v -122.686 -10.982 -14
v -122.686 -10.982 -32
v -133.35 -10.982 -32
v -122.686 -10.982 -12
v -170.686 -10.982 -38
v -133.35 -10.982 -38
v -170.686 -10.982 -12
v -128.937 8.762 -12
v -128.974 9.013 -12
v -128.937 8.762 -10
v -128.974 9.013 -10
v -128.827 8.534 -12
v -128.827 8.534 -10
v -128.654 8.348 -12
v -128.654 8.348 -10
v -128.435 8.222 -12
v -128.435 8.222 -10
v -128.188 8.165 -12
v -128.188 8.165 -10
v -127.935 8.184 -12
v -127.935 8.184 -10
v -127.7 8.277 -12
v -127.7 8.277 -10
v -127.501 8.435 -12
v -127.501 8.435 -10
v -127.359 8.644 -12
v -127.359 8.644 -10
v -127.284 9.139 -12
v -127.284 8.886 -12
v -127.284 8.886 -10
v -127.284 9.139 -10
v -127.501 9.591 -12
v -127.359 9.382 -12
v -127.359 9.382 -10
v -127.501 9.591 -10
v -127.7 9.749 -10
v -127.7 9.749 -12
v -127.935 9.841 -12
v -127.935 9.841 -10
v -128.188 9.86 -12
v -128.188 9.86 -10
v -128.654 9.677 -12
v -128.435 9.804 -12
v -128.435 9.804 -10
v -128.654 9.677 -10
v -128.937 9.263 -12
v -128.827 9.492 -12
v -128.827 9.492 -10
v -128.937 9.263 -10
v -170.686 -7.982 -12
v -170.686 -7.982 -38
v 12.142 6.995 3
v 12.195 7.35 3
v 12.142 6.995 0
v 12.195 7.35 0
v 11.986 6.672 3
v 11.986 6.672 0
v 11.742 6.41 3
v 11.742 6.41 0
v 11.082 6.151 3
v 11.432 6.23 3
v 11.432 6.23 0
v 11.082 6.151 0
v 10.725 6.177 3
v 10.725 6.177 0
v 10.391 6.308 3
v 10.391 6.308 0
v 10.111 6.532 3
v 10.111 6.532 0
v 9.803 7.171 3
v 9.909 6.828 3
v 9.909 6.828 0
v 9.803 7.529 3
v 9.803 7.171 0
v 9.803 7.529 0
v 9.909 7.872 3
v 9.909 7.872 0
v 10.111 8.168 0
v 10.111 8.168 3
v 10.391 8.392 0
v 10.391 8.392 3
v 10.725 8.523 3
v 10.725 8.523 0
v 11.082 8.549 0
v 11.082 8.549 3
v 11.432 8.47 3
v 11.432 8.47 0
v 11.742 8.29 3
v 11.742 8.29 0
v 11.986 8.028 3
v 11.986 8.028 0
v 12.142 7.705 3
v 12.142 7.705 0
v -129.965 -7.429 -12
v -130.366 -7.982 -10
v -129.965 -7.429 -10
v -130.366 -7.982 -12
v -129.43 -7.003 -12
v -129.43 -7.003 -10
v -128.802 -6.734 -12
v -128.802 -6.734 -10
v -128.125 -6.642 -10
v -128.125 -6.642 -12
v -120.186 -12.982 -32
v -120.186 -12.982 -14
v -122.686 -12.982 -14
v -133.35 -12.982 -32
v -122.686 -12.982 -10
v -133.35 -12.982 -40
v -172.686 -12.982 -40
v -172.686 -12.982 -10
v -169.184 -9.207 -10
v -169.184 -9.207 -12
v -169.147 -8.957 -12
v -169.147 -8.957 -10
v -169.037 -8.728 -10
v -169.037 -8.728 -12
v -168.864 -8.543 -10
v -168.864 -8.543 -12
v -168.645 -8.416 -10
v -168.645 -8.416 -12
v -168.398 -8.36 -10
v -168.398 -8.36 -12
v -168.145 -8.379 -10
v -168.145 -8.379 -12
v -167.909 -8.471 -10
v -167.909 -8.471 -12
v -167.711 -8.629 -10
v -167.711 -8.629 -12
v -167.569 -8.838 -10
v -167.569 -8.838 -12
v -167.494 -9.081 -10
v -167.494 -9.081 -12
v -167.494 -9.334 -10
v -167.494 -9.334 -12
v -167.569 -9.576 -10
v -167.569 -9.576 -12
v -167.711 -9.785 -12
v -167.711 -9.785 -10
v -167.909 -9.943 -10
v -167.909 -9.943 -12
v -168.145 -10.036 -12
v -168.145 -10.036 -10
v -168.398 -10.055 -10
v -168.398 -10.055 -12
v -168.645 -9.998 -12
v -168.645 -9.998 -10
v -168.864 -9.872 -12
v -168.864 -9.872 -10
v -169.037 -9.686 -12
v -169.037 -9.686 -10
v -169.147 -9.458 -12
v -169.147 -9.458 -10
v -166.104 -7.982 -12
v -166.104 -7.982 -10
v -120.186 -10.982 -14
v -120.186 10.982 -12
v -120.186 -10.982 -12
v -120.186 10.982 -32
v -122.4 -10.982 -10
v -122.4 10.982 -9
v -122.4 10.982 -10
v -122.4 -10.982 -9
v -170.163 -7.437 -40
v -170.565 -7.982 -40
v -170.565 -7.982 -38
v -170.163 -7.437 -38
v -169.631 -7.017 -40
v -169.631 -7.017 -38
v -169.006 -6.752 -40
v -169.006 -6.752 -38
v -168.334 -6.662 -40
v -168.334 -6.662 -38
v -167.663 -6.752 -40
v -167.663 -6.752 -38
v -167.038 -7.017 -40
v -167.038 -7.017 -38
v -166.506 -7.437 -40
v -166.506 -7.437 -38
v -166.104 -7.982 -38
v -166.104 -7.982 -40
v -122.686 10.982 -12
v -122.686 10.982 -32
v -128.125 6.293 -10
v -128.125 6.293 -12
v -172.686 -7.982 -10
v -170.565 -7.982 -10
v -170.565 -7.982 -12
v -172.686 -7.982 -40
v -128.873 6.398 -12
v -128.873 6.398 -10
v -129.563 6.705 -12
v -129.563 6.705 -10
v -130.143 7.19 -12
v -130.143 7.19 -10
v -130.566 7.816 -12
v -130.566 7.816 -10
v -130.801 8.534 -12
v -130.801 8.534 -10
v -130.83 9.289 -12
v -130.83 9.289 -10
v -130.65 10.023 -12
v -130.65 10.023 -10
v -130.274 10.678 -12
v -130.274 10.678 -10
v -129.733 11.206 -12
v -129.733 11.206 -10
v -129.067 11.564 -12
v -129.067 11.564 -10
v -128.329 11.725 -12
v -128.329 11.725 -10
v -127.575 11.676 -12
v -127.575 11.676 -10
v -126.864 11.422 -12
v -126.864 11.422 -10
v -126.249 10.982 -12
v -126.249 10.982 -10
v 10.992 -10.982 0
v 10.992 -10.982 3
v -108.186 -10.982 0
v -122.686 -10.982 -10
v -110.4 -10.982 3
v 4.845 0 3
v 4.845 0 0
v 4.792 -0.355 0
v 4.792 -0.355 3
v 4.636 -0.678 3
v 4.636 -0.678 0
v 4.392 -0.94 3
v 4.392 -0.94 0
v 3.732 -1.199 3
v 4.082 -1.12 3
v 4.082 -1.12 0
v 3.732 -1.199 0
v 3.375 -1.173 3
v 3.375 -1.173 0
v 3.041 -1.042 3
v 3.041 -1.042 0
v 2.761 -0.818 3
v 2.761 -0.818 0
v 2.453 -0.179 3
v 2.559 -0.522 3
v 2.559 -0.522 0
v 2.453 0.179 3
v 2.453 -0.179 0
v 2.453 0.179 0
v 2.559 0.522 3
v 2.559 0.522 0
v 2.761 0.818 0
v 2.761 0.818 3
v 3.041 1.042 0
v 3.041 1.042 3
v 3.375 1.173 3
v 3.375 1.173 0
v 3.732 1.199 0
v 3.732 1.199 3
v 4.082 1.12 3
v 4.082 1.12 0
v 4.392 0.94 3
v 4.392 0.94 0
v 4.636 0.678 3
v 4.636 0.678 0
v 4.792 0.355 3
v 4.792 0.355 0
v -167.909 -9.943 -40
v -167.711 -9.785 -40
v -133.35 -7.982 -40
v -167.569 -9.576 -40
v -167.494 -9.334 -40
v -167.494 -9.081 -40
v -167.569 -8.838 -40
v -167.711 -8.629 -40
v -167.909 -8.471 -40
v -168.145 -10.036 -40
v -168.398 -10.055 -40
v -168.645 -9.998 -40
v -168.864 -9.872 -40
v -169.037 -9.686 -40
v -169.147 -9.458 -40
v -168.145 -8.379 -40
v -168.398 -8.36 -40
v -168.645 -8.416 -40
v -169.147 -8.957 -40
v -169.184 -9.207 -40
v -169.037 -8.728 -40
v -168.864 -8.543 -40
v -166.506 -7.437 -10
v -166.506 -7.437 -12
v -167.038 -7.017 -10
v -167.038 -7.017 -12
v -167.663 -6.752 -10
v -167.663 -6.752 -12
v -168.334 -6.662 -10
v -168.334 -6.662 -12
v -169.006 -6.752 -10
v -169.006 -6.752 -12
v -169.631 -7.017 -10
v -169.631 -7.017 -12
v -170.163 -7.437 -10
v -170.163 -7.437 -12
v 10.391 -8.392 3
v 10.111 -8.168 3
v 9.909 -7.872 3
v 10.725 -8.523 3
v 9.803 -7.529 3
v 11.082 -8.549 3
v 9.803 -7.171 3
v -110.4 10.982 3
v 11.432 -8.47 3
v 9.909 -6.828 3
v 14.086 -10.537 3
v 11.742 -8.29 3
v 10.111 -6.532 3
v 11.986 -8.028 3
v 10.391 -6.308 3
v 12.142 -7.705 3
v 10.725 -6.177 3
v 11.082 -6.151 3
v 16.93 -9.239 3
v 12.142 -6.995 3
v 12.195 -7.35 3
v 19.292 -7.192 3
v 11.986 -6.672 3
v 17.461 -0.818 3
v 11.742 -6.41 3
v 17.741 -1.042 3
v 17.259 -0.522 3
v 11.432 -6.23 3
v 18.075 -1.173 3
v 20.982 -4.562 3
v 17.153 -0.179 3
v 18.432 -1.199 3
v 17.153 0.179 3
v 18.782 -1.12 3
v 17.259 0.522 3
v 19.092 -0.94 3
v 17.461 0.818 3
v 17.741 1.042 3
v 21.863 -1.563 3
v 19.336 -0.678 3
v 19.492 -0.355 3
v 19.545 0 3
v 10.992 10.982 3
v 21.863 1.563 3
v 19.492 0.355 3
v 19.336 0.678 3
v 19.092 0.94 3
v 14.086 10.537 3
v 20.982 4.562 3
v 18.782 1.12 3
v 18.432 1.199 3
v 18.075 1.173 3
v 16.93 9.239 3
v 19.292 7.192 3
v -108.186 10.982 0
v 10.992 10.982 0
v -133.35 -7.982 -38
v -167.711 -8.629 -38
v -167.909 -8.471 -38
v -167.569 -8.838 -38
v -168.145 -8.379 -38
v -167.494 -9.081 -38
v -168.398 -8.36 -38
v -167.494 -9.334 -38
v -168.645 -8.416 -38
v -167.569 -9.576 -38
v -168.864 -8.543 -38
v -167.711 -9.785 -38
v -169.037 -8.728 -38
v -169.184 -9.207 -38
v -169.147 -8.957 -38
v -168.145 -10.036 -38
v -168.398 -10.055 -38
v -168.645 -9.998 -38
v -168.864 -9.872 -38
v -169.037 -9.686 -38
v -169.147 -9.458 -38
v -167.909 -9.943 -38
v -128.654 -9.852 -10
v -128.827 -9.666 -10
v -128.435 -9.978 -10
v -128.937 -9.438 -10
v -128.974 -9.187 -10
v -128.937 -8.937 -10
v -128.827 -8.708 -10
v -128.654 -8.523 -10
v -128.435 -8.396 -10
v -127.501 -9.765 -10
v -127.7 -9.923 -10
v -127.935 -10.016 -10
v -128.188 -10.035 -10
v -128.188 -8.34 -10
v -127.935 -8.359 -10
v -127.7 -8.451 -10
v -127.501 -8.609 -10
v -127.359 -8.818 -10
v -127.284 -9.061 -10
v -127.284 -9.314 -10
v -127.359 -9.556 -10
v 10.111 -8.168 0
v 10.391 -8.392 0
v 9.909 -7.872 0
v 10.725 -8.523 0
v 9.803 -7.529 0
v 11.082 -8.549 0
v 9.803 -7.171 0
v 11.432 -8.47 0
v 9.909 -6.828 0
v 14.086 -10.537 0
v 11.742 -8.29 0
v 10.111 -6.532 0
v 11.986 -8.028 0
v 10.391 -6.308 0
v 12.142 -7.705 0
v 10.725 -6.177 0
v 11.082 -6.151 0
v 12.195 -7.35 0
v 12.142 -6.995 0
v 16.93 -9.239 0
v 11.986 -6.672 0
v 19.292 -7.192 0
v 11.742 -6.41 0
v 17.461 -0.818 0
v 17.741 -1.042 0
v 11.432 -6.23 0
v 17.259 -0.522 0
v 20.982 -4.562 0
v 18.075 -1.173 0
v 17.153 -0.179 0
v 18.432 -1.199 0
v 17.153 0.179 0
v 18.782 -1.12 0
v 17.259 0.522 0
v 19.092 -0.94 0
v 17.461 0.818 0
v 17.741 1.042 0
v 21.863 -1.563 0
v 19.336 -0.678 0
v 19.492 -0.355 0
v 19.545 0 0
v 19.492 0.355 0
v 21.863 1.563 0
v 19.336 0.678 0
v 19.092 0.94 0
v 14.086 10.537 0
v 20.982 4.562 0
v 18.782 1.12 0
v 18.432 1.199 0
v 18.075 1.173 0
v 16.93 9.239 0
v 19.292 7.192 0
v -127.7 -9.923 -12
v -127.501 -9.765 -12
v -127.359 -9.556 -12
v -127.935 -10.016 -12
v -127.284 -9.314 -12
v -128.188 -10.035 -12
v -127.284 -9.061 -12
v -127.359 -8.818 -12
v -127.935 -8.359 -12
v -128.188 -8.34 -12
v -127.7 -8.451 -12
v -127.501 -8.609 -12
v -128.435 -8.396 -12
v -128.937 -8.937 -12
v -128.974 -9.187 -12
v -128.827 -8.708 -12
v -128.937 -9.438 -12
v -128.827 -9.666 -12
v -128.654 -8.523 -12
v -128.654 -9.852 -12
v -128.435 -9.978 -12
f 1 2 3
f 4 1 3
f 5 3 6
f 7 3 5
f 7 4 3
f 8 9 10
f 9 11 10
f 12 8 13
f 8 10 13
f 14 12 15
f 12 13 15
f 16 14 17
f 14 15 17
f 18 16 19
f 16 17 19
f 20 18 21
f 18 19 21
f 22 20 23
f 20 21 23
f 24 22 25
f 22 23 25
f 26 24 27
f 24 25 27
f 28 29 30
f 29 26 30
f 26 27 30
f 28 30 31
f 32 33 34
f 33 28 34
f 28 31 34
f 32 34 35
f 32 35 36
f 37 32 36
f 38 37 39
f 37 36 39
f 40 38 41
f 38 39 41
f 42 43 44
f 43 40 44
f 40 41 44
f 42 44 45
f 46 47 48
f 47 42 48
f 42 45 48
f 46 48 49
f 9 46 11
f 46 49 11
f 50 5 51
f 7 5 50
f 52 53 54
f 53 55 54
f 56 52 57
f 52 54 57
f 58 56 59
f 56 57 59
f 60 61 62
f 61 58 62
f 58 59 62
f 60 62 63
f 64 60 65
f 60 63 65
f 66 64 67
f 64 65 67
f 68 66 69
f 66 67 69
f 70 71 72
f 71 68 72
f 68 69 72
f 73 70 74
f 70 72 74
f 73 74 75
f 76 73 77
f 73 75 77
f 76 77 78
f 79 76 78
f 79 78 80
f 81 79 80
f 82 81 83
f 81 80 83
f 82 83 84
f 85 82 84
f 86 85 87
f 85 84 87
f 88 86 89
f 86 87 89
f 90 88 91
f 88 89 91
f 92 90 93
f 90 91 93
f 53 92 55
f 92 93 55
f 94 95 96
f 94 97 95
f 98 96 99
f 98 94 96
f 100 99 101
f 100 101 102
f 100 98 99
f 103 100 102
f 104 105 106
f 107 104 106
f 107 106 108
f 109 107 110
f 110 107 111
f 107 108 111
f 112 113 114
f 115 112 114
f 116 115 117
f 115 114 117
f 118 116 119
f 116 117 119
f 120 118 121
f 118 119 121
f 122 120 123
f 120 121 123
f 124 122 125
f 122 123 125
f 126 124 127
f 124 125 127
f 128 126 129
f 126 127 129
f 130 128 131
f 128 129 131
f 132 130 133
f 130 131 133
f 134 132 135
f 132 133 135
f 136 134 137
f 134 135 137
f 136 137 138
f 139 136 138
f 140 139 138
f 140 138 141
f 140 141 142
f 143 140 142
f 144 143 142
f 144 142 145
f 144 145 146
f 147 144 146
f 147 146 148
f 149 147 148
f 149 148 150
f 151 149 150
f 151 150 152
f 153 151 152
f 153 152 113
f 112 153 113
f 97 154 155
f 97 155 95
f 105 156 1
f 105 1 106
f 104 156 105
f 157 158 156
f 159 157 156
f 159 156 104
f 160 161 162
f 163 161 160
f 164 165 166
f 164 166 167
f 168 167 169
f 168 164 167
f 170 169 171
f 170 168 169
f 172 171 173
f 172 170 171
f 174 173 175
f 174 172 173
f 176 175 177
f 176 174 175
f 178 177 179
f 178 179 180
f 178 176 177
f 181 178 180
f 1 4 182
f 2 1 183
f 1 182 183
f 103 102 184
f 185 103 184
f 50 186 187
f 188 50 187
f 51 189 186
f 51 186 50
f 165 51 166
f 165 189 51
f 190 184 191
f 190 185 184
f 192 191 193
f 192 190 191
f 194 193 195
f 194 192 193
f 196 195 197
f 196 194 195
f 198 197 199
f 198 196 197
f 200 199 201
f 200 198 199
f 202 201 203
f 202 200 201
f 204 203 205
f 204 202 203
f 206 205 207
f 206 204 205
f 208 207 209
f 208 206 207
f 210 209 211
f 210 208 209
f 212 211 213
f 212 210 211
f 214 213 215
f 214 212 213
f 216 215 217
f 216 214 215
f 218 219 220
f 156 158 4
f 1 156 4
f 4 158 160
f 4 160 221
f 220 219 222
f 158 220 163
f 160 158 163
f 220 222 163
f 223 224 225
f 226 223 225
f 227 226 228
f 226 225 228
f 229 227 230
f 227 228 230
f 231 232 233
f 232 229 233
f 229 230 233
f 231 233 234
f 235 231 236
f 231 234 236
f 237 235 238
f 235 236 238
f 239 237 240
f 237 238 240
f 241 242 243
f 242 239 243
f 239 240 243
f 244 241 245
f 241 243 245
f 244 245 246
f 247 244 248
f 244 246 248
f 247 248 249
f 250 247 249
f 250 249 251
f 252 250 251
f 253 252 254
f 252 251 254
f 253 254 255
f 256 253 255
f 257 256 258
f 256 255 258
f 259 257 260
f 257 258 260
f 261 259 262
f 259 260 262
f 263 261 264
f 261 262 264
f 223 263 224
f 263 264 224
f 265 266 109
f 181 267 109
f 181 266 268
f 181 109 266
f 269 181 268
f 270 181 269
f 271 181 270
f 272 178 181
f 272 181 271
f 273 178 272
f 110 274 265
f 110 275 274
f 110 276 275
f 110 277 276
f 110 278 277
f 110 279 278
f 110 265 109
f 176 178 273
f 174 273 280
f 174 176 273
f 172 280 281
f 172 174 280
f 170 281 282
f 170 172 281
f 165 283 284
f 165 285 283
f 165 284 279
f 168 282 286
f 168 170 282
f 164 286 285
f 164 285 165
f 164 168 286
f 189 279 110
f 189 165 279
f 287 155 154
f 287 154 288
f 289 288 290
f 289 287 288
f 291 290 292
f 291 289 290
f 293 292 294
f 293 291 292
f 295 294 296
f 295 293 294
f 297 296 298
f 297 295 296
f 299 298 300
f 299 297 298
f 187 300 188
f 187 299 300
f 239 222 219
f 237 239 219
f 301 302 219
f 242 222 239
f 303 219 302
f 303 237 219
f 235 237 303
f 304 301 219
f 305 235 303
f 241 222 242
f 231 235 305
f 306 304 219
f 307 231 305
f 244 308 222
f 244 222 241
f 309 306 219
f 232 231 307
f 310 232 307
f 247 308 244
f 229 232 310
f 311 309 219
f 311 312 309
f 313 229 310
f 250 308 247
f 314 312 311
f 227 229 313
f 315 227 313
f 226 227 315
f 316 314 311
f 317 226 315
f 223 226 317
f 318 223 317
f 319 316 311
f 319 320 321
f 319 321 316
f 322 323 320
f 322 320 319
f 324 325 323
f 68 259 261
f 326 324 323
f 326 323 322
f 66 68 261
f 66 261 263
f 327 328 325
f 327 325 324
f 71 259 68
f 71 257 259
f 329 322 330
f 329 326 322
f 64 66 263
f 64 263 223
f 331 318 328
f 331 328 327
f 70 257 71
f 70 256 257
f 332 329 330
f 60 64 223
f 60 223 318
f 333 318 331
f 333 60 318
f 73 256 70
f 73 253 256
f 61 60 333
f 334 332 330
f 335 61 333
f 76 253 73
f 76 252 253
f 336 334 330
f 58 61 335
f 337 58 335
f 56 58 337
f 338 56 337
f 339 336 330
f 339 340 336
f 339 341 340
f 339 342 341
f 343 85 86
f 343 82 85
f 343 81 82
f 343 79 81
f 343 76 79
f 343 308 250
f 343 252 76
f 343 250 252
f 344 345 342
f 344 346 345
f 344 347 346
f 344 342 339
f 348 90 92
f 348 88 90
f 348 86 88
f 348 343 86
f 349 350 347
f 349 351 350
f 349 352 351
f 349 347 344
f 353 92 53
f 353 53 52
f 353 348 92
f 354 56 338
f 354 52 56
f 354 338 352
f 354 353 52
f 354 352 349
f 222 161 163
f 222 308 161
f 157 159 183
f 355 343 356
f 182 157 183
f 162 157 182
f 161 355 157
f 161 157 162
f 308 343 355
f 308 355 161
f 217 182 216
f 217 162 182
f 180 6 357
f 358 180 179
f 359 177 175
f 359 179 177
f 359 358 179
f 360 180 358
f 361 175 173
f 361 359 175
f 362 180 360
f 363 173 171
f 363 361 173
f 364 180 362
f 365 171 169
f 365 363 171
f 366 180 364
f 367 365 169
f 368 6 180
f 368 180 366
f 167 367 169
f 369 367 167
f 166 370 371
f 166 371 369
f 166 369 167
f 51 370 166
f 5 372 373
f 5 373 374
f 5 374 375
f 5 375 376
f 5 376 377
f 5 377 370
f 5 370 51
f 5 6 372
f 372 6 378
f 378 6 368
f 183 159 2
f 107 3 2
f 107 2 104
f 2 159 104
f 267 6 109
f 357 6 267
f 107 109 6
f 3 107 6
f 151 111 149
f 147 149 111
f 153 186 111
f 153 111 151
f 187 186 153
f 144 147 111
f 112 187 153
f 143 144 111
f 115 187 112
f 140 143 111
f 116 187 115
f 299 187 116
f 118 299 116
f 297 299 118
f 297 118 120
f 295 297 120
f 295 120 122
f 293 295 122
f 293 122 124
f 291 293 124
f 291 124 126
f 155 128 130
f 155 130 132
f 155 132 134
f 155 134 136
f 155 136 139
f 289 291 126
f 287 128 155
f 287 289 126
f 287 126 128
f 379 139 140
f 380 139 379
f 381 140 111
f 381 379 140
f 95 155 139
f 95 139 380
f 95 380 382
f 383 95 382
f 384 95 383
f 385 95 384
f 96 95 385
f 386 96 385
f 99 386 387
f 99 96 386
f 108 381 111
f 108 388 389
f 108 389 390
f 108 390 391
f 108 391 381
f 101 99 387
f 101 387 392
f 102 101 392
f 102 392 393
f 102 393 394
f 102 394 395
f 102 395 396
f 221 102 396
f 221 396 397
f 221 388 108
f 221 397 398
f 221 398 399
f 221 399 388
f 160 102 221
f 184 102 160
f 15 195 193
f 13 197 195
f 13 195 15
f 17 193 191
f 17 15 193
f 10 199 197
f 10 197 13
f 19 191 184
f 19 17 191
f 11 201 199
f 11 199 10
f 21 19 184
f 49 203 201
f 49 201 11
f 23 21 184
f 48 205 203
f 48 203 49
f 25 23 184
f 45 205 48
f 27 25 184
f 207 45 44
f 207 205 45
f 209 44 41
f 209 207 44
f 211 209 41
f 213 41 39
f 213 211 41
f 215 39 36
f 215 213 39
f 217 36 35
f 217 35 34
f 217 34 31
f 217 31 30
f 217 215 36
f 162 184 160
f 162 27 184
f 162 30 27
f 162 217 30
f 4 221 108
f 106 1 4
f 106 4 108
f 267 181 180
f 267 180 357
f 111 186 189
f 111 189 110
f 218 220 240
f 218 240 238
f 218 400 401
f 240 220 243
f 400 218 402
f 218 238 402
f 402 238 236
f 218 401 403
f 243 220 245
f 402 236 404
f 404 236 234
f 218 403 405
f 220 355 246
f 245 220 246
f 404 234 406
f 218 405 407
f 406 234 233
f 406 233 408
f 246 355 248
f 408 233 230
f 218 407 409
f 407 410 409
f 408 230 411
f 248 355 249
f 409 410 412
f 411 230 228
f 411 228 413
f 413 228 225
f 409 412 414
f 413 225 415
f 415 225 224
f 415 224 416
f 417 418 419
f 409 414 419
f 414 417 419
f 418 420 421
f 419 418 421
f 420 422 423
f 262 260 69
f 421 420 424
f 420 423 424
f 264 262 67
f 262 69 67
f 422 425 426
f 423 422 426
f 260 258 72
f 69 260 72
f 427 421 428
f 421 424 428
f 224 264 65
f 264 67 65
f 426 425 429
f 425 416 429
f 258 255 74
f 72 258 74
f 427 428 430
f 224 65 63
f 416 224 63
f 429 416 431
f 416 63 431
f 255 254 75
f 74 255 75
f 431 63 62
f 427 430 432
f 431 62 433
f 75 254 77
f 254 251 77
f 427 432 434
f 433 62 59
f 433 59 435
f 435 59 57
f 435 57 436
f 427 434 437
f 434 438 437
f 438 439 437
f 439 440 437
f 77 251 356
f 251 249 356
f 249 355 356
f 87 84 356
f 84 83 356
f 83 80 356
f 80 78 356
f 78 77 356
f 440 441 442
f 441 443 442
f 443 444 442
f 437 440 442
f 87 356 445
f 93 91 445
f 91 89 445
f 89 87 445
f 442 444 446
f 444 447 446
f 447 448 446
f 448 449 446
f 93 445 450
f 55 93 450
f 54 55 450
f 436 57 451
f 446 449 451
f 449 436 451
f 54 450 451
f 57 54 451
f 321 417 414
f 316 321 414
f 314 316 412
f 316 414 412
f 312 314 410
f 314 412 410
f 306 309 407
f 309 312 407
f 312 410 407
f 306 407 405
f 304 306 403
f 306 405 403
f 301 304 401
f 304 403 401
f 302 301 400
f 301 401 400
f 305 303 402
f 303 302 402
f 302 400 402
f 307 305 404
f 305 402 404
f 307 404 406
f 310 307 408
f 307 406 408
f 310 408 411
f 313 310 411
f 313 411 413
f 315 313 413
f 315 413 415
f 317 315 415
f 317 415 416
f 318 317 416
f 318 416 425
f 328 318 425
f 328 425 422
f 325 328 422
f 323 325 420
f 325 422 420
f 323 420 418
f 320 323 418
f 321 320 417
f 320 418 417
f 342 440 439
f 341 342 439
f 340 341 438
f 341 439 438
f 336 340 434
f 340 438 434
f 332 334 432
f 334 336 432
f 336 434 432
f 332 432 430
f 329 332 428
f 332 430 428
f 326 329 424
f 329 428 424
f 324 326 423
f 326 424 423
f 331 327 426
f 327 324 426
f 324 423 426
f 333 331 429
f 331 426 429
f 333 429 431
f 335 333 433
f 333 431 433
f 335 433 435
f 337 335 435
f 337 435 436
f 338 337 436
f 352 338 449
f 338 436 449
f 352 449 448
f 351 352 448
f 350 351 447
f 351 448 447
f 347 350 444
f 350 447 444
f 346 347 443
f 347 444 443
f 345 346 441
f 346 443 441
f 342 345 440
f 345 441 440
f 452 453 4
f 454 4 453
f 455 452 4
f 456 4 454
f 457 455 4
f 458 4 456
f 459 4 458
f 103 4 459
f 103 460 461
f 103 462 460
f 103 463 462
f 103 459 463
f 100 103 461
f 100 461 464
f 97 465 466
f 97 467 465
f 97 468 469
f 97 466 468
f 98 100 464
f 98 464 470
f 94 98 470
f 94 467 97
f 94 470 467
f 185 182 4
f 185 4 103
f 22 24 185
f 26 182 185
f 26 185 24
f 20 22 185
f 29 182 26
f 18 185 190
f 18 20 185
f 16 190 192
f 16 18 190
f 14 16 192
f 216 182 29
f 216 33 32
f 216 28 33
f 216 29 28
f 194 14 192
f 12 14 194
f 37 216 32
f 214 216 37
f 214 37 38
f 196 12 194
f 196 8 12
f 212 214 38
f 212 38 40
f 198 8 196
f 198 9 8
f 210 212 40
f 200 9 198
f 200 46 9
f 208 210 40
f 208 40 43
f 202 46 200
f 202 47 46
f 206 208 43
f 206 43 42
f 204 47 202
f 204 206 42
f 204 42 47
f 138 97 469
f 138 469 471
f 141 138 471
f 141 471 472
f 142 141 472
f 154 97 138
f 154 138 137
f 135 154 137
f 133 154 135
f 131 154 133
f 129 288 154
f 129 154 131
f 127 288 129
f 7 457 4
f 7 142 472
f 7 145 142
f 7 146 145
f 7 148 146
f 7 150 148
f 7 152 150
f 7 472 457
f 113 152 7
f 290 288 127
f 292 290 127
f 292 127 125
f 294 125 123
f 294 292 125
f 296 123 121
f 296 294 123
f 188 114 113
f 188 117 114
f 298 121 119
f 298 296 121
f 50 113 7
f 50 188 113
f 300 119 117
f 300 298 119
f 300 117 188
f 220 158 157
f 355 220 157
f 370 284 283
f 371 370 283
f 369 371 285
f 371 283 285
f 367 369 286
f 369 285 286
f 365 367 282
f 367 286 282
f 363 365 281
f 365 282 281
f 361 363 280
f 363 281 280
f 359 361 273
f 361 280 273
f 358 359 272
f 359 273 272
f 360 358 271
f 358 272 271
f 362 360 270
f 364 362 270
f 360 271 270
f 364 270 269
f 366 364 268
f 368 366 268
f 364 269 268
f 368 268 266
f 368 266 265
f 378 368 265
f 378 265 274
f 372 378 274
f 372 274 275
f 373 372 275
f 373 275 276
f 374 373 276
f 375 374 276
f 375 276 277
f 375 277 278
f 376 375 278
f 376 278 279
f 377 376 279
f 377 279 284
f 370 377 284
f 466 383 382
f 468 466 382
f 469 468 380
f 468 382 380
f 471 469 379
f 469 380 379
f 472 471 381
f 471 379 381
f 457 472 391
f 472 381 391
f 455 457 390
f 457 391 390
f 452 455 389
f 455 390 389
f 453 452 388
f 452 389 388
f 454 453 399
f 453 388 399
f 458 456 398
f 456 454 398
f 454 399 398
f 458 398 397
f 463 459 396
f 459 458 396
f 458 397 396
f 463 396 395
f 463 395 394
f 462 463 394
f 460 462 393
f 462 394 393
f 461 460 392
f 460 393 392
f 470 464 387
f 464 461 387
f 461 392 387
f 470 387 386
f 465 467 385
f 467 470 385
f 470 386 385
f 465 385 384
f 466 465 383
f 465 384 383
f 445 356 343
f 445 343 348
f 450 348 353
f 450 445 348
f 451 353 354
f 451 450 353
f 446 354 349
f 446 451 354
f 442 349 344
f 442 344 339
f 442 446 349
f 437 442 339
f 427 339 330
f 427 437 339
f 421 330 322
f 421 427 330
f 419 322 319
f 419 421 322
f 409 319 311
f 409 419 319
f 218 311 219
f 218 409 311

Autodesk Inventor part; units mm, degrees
ref_plane "YZ Plane" through (0, 0, 0) normal (1, 0, 0) x (0, 1, 0)
ref_plane "XZ Plane" through (0, 0, 0) normal (0, 1, 0) x (-1, 0, 0)
ref_plane "XY Plane" through (0, 0, 0) normal (0, 0, 1) x (1, 0, 0)
ref_plane "Plano de trabajo1" through (0, 0, 0) normal (0, 0, 1) x (1, 0, 0)
sketch "Boceto1" plane through (0, 0, 0) normal (0, 0, 1) x (1, 0, 0)
  circle A0 centre (10.9923, -7.35) radius 1.2028 projected
  circle A1 centre (3.6423, 0) radius 1.2028 projected
  circle A2 centre (18.3423, 0) radius 1.2028 projected
  circle A3 centre (10.9923, 7.35) radius 1.2028 projected
  circle A4 centre (10.9923, 0) radius 10.9823 projected
  line L0 (10.9923, -10.9823) -> (-139.0077, -10.9823)
  line L1 (10.9923, 10.9823) -> (-139.0077, 10.9823)
  line L2 (-139.0077, 10.9823) -> (-139.0077, -10.9823)
  point P0 (0, 0)
  dimension "d0" = 150
  dimension "d1" = 150
extrude "Extrusión1" add sketch "Boceto1" along normal blind 3
sketch "Boceto2" plane through (0, 0, 3) normal (0, 0, 1) x (1, 0, 0)
  arc A0 (-129.1978, -5.6745) -> (-132.1454, -8.5217) centre (-128.1245, -9.7351) ccw
  circle A1 centre (-128.1245, 8.4649) radius 0.85 construction
  circle A2 centre (-128.1245, -9.7351) radius 0.7049 construction
  line L0 (-139.0305, -11.0697) -> (-267.2186, 10.8953)
  line L1 (-267.2186, -11.0694) -> (-117.2186, -11.0694)
  line L2 (-139.0305, 10.8953) -> (-139.0305, -11.0694)
  line L3 (-117.2186, 10.8953) -> (-267.2186, 10.8953)
  line L4 (-128.1245, -11.0697) -> (-128.1245, -0.0872)
  line L5 (-128.1245, -0.0872) -> (-128.1245, 9.0128)
  line L6 (-128.1245, -0.0872) -> (-128.1245, -9.1872)
  circle A3 centre (-128.1245, -9.1872) radius 0.85
  circle A4 centre (-128.1245, 9.0128) radius 0.85
  circle A5 centre (-128.1245, -9.1872) radius 1.8825
  circle A6 centre (-128.1245, 9.0128) radius 1.8821
  circle A7 centre (-128.1245, 9.0128) radius 0.85
  circle A8 centre (-128.1245, -9.1872) radius 0.85
  line L7 (-128.1245, 10.8953) -> (-139.0305, 10.8953)
  line L8 (-139.0077, 10.9823) -> (-139.0077, -10.9823) projected
  line L9 (-139.0077, -10.9823) -> (-139.0077, 10.9823)
  line L10 (-139.0077, 10.9823) -> (-139.0077, -10.9823)
  point P0 (0, 0)
  dimension "d4" = 10.9825
  dimension "d5" = 9.1
  dimension "d6" = 9.1
  dimension "d7" = 1.7
  dimension "d8" = 1.7
extrude "Extrusión2" cut sketch "Boceto2" against normal blind 3 contours A3 L4 | L4 A3 | A4
sketch "Boceto3" plane through (0, 0, 3) normal (0, 0, 1) x (1, 0, 0)
  circle A0 centre (-128.1245, -9.1872) radius 0.85 projected
  circle A1 centre (-128.1245, 9.0128) radius 0.85 projected
  line L0 (10.9923, 10.9823) -> (-139.0077, 10.9823) projected
  line L1 (-139.0077, 10.9823) -> (-139.0077, -10.9823) projected
  line L2 (-139.0077, -10.9823) -> (10.9923, -10.9823) projected
  arc A2 (10.9923, -10.9823) -> (10.9923, 10.9823) centre (10.9923, 0) ccw projected
  circle A3 centre (10.9923, -7.35) radius 1.2028 projected
  circle A4 centre (3.6423, 0) radius 1.2028 projected
  circle A5 centre (18.3423, 0) radius 1.2028 projected
  circle A6 centre (10.9923, 7.35) radius 1.2028 projected
  line L3 (-130.1442, 5.5225) -> (-129.5361, 14.2169) projected
  circle A7 centre (-128.1245, -9.1872) radius 1.7951
  circle A8 centre (-128.1245, 9.0128) radius 1.9695
  line L4 (-128.1245, -7.3921) -> (-128.1245, 7.0432)
  line L5 (-128.1245, -10.9823) -> (-128.1245, -18.0451)
  line L6 (-128.1245, -18.0451) -> (-142.6221, -18.554)
  line L7 (-142.6221, -18.554) -> (-141.7315, 12.8288)
  line L8 (-141.7315, 12.8288) -> (-128.1245, 12.4426)
  line L9 (-128.1245, 12.4426) -> (-128.1245, 10.9823)
  point P0 (0, 0)
extrude "Extrusión3" cut sketch "Boceto3" against normal blind 3 contours A8 L3 L0 | L3 A8 L4 A7 L2 L1 L0
sketch "Boceto4" plane through (0, 0, 0) normal (0, 0, -1) x (-1, 0, 0)
  arc A0 (128.1245, 7.0432) -> (128.1245, 10.9823) centre (128.1245, 9.0128) ccw projected
  line L0 (-10.9923, 10.9823) -> (128.1245, 10.9823) projected
  arc A1 (-10.9923, 10.9823) -> (-10.9923, -10.9823) centre (-10.9923, 0) ccw projected
  line L1 (128.1245, -10.9823) -> (-10.9923, -10.9823) projected
  arc A2 (128.1245, -10.9823) -> (128.1245, -7.3921) centre (128.1245, -9.1872) ccw projected
  line L2 (128.1245, -7.3921) -> (128.1245, 7.0432) projected
  circle A3 centre (128.1245, -9.1872) radius 0.85 projected
  circle A4 centre (128.1245, 9.0128) radius 0.85 projected
  circle A5 centre (-10.9923, -7.35) radius 1.2028 projected
  circle A6 centre (-3.6423, 0) radius 1.2028 projected
  circle A7 centre (-18.3423, 0) radius 1.2028 projected
  circle A8 centre (-10.9923, 7.35) radius 1.2028 projected
  line L3 (108.1857, 10.9823) -> (108.1857, -10.9823)
  point P0 (0, 0)
extrude "Extrusión4" add sketch "Boceto4" along normal blind 12 contours L2 A2 L1 L3 L0 A0
sketch "Boceto5" plane through (0, 0, 3) normal (0, 0, 1) x (1, 0, 0)
  line L0 (-108.1857, -10.9823) -> (-108.1857, 10.9823) projected
  circle A0 centre (10.9923, 7.35) radius 1.2028 projected
  circle A1 centre (18.3423, 0) radius 1.2028 projected
  circle A2 centre (3.6423, 0) radius 1.2028 projected
  circle A3 centre (10.9923, -7.35) radius 1.2028 projected
  arc A4 (-128.1245, 10.9823) -> (-128.1245, 7.0432) centre (-128.1245, 9.0128) ccw projected
  line L1 (-128.1245, 7.0432) -> (-128.1245, -7.3921) projected
  arc A5 (-128.1245, -7.3921) -> (-128.1245, -10.9823) centre (-128.1245, -9.1872) ccw projected
  line L2 (-128.1245, -10.9823) -> (10.9923, -10.9823) projected
  arc A6 (10.9923, -10.9823) -> (10.9923, 10.9823) centre (10.9923, 0) ccw projected
  line L3 (10.9923, 10.9823) -> (-128.1245, 10.9823) projected
  circle A7 centre (-128.1245, 9.0128) radius 0.85 projected
  circle A8 centre (-128.1245, -9.1872) radius 0.85 projected
  line L4 (-108.1857, 10.9823) -> (-111.1857, 10.9823)
  line L5 (-111.1857, 10.9823) -> (-111.1857, -10.9823)
  line L6 (-111.1857, -10.9823) -> (-108.1857, -10.9823)
  line L7 (-108.1857, -10.9823) -> (-108.1857, 10.9823)
  line L8 (10.9923, 10.9823) -> (-128.1245, 10.9823) projected
  line L9 (-122.3999, 10.9823) -> (-122.3999, -10.9823)
  point P0 (0, 0)
  dimension "d15" = 3
extrude "Extrusión5" cut sketch "Boceto5" against normal blind 13 contours L2 A5 L1 A4 L3 L9
chamfer "Chaflán1" distance 12 angle 45 1 edges at (-122.3999, 0, 3)
chamfer "Chaflán2" distance 12 angle 45 1 edges at (-108.1857, 0, -12)
sketch "Boceto6" plane through (0, 0, -12) normal (0, 0, -1) x (-1, 0, 0)
  line L0 (126.0445, -11.1372) -> (126.0445, 10.9228)
  line L1 (120.1857, -10.9823) -> (120.1857, 10.9823) projected
  line L2 (120.1857, -10.9823) -> (128.1245, -10.9823) projected
  line L3 (120.1857, 10.9823) -> (122.6857, 10.9823)
  line L4 (122.6857, 10.9823) -> (122.6857, -10.9823)
  line L5 (122.6857, -10.9823) -> (120.1857, -10.9823)
  line L6 (120.1857, -10.9823) -> (120.1857, 10.9823)
  point P0 (0, 0)
  dimension "d24" = 2.5
extrude "Extrusión6" add sketch "Boceto6" along normal blind 20
sketch "Boceto7" plane through (-128.1245, -10.9823, -10) normal (0, -1, 0) x (1, 0, 0)
  line L0 (19.9388, 10) -> (7.9388, -2) projected
  line L1 (19.9388, 10) -> (139.1168, 10) projected
  line L2 (139.1168, 10) -> (139.1168, 13) projected
  line L3 (17.7246, 13) -> (139.1168, 13) projected
  line L4 (5.7246, 1) -> (17.7246, 13) projected
  line L5 (5.7246, 1) -> (5.7246, 0) projected
  line L6 (5.7246, 0) -> (0, 0) projected
  line L7 (0, 0) -> (0, -2) projected
  line L8 (5.4388, -2) -> (0, -2) projected
  line L9 (5.4388, -2) -> (5.4388, -22) projected
  line L10 (7.9388, -22) -> (5.4388, -22) projected
  line L11 (7.9388, -2) -> (7.9388, -22) projected
  line L12 (7.9388, -2) -> (7.9388, -22) projected
  line L13 (5.4388, -22) -> (7.9388, -22)
  line L14 (7.9388, -22) -> (7.9388, -4)
  line L15 (7.9388, -4) -> (5.4388, -4)
  line L16 (5.4388, -4) -> (5.4388, -22)
  point P0 (128.1245, 10)
  point P1 (5.4388, -4)
  dimension "d27" = 18
extrude "Extrusión7" add sketch "Boceto7" along normal blind 2 contours L11 L10 L9 L15
sketch "Boceto8" plane through (-122.6857, -10.9823, -12) normal (-1, 0, 0) x (0, 0, 1)
  line L0 (0, 21.9646) -> (0, 0) projected
  line L1 (0, 21.9646) -> (-20, 21.9646) projected
  line L2 (-20, 21.9646) -> (-20, -2) projected
  line L3 (-2, -2) -> (-20, -2) projected
  line L4 (-2, 0) -> (-2, -2) projected
  line L5 (0, 0) -> (-2, 0) projected
  line L6 (-20, 0) -> (-2, 0)
  point P0 (12, 10.9823)
extrude "Extrusión8" add sketch "Boceto8" along normal blind 50 contours L4 L3 L2 L6
sketch "Boceto9" plane through (-120.1857, -12.9823, -14) normal (0, 0, 1) x (1, 0, 0)
  line L0 (-2.5, 2) -> (0, 2) projected
  line L1 (-2.5, 2) -> (-52.5, 2) projected
  line L2 (-52.5, 0) -> (-52.5, 2) projected
  line L3 (0, 0) -> (-52.5, 0) projected
  line L4 (0, 2) -> (0, 0) projected
  line L5 (-2.5, 0) -> (-52.5, 0)
  line L6 (-52.5, 0) -> (-52.5, 2)
  line L7 (-52.5, 2) -> (-2.5, 2)
  line L8 (-2.5, 2) -> (-2.5, 0)
  point P0 (120.1857, 12.9823)
extrude "Extrusión9" add sketch "Boceto9" along normal blind 4 contours L8 L3 L2 L1
sketch "Boceto10" plane through (0, 0, -32) normal (0, 0, -1) x (-1, 0, 0)
  line L0 (120.1857, 10.9823) -> (120.1857, -12.9823) projected
  line L1 (120.1857, -12.9823) -> (172.6857, -12.9823) projected
  line L2 (172.6857, -10.9823) -> (172.6857, -12.9823) projected
  line L3 (122.6857, -10.9823) -> (172.6857, -10.9823) projected
  line L4 (122.6857, 10.9823) -> (122.6857, -10.9823) projected
  line L5 (122.6857, 10.9823) -> (120.1857, 10.9823) projected
  line L6 (133.3495, -12.9823) -> (133.3495, -10.9823)
  line L7 (128.1245, -10.9823) -> (172.6857, -10.9823) projected
  point P0 (0, 0)
extrude "Extrusión10" add sketch "Boceto10" along normal blind 8 contours L6 L3 L2 L1
sketch "Boceto11" plane through (-172.6857, -10.9823, -10) normal (0, 1, 0) x (1, 0, 0)
  line L0 (50, 22) -> (50, 4) projected
  line L1 (50, 22) -> (39.3362, 22) projected
  line L2 (39.3362, 22) -> (39.3362, 30) projected
  line L3 (0, 30) -> (39.3362, 30) projected
  line L4 (0, 30) -> (0, 0) projected
  line L5 (44.5612, 0) -> (0, 0) projected
  line L6 (44.5612, 0) -> (44.5612, 2) projected
  line L7 (50, 2) -> (44.5612, 2) projected
  line L8 (50, 2) -> (50, 4) projected
  line L9 (39.3362, 22) -> (39.3362, 30) projected
  line L10 (39.3362, 30) -> (39.3362, 28)
  line L11 (39.3362, 28) -> (0, 28)
  line L12 (0, 28) -> (2, 28)
  line L13 (2, 28) -> (2, 0)
  line L14 (0, 0) -> (0, 30) projected
  line L15 (0, 0) -> (0, 2)
  line L16 (0, 2) -> (43.0714, 2)
  line L17 (43.0714, 2) -> (43.0714, 0)
  line L18 (44.5612, 0) -> (0, 0) projected
  point P0 (172.6857, -10)
  point P1 (2, 2)
  point P2 (39.3362, 28)
  dimension "d36" = 2
  dimension "d37" = 2
  dimension "d38" = 2
extrude "Extrusión11" add sketch "Boceto11" along normal blind 3 contours L11 L4 L3 L2 | L13 L16 L4 L11 | L16 L17 L5 L13 | L13 L5 L4 L16
sketch "Boceto12" plane through (0, 0, -40) normal (0, 0, -1) x (-1, 0, 0)
  circle A0 centre (168.3345, -9.2072) radius 0.85
  point P0 (0, 0)
extrude "Extrusión12" cut sketch "Boceto12" against normal blind 35
sketch "Boceto13" plane through (0, 0, -12) normal (0, 0, -1) x (-1, 0, 0)
  circle A0 centre (168.3345, -9.2072) radius 0.85 projected
  circle A1 centre (128.1245, 9.0128) radius 0.85 projected
  circle A2 centre (128.1245, -9.1872) radius 0.85 projected
  arc A3 (129.6143, -8.1857) -> (128.1245, -7.3921) centre (128.1245, -9.1872) ccw projected
  line L0 (128.1245, -7.3921) -> (128.1245, 7.0432) projected
  arc A4 (128.1245, 7.0432) -> (128.1245, 10.9823) centre (128.1245, 9.0128) ccw projected
  line L1 (128.1245, 10.9823) -> (122.6857, 10.9823) projected
  line L2 (122.6857, 10.9823) -> (122.6857, -10.9823) projected
  line L3 (122.6857, -10.9823) -> (128.1245, -10.9823) projected
  arc A5 (128.1245, -10.9823) -> (129.6143, -10.1887) centre (128.1245, -9.1872) ccw projected
  line L4 (129.6143, -10.9823) -> (129.6143, -10.1887) projected
  line L5 (170.6857, -10.9823) -> (129.6143, -10.9823) projected
  line L6 (170.6857, -10.9823) -> (170.6857, -7.9823) projected
  line L7 (129.6143, -7.9823) -> (170.6857, -7.9823) projected
  line L8 (129.6143, -8.1857) -> (129.6143, -7.9823) projected
  circle A6 centre (128.1245, 9.0128) radius 2.7195
  circle A7 centre (128.1245, -9.1872) radius 2.545
  point P0 (0, 0)
  point P1 (126.3205, -10.9823)
  point P2 (129.9286, -10.9823)
  point P3 (130.3662, -7.9823)
  point P4 (128.1245, -6.6422)
  point P5 (128.1245, 6.2933)
  point P6 (126.2493, 10.9823)
  dimension "d43" = 5.439
  dimension "d44" = 5.09
extrude "Extrusión13" add sketch "Boceto13" against normal blind 2 contours A3 L0 A7 L7 L8 | L0 A4 L1 A6 | L3 A5 L4 L5 A7 picked at (127.0429, 11.109)
sketch "Boceto14" plane through (0, 0, -10) normal (0, 0, 1) x (1, 0, 0)
  circle A0 centre (-128.1245, -9.1872) radius 0.85 projected
  arc A1 (-128.1245, -6.6422) -> (-130.3662, -7.9823) centre (-128.1245, -9.1872) ccw projected
  circle A2 centre (-168.3345, -9.2072) radius 0.85 projected
  circle A3 centre (-168.3345, -9.2072) radius 0.85 projected
  circle A4 centre (-168.3345, -9.2072) radius 2.545
  line L0 (-172.6857, -7.9823) -> (-130.3662, -7.9823) projected
  point P0 (0, 0)
  point P1 (-170.5654, -7.9823)
  point P2 (-166.1037, -7.9823)
  dimension "d47" = 5.09
extrude "Extrusión14" add sketch "Boceto14" against normal blind 2 contours L0 A4 picked at (-168.0387, -7.2686)
sketch "Boceto15" plane through (0, 0, -40) normal (0, 0, -1) x (-1, 0, 0)
  circle A0 centre (168.3345, -9.2072) radius 0.85 projected
  circle A1 centre (168.3345, -9.2072) radius 2.545
  line L0 (133.3495, -7.9823) -> (172.6857, -7.9823) projected
  point P0 (0, 0)
  point P1 (166.1037, -7.9823)
  point P2 (170.5654, -7.9823)
  dimension "d50" = 5.09
extrude "Extrusión15" add sketch "Boceto15" against normal blind 2 contours L0 A1 picked at (168.6303, -7.2686)
properties part number "femurAux"
